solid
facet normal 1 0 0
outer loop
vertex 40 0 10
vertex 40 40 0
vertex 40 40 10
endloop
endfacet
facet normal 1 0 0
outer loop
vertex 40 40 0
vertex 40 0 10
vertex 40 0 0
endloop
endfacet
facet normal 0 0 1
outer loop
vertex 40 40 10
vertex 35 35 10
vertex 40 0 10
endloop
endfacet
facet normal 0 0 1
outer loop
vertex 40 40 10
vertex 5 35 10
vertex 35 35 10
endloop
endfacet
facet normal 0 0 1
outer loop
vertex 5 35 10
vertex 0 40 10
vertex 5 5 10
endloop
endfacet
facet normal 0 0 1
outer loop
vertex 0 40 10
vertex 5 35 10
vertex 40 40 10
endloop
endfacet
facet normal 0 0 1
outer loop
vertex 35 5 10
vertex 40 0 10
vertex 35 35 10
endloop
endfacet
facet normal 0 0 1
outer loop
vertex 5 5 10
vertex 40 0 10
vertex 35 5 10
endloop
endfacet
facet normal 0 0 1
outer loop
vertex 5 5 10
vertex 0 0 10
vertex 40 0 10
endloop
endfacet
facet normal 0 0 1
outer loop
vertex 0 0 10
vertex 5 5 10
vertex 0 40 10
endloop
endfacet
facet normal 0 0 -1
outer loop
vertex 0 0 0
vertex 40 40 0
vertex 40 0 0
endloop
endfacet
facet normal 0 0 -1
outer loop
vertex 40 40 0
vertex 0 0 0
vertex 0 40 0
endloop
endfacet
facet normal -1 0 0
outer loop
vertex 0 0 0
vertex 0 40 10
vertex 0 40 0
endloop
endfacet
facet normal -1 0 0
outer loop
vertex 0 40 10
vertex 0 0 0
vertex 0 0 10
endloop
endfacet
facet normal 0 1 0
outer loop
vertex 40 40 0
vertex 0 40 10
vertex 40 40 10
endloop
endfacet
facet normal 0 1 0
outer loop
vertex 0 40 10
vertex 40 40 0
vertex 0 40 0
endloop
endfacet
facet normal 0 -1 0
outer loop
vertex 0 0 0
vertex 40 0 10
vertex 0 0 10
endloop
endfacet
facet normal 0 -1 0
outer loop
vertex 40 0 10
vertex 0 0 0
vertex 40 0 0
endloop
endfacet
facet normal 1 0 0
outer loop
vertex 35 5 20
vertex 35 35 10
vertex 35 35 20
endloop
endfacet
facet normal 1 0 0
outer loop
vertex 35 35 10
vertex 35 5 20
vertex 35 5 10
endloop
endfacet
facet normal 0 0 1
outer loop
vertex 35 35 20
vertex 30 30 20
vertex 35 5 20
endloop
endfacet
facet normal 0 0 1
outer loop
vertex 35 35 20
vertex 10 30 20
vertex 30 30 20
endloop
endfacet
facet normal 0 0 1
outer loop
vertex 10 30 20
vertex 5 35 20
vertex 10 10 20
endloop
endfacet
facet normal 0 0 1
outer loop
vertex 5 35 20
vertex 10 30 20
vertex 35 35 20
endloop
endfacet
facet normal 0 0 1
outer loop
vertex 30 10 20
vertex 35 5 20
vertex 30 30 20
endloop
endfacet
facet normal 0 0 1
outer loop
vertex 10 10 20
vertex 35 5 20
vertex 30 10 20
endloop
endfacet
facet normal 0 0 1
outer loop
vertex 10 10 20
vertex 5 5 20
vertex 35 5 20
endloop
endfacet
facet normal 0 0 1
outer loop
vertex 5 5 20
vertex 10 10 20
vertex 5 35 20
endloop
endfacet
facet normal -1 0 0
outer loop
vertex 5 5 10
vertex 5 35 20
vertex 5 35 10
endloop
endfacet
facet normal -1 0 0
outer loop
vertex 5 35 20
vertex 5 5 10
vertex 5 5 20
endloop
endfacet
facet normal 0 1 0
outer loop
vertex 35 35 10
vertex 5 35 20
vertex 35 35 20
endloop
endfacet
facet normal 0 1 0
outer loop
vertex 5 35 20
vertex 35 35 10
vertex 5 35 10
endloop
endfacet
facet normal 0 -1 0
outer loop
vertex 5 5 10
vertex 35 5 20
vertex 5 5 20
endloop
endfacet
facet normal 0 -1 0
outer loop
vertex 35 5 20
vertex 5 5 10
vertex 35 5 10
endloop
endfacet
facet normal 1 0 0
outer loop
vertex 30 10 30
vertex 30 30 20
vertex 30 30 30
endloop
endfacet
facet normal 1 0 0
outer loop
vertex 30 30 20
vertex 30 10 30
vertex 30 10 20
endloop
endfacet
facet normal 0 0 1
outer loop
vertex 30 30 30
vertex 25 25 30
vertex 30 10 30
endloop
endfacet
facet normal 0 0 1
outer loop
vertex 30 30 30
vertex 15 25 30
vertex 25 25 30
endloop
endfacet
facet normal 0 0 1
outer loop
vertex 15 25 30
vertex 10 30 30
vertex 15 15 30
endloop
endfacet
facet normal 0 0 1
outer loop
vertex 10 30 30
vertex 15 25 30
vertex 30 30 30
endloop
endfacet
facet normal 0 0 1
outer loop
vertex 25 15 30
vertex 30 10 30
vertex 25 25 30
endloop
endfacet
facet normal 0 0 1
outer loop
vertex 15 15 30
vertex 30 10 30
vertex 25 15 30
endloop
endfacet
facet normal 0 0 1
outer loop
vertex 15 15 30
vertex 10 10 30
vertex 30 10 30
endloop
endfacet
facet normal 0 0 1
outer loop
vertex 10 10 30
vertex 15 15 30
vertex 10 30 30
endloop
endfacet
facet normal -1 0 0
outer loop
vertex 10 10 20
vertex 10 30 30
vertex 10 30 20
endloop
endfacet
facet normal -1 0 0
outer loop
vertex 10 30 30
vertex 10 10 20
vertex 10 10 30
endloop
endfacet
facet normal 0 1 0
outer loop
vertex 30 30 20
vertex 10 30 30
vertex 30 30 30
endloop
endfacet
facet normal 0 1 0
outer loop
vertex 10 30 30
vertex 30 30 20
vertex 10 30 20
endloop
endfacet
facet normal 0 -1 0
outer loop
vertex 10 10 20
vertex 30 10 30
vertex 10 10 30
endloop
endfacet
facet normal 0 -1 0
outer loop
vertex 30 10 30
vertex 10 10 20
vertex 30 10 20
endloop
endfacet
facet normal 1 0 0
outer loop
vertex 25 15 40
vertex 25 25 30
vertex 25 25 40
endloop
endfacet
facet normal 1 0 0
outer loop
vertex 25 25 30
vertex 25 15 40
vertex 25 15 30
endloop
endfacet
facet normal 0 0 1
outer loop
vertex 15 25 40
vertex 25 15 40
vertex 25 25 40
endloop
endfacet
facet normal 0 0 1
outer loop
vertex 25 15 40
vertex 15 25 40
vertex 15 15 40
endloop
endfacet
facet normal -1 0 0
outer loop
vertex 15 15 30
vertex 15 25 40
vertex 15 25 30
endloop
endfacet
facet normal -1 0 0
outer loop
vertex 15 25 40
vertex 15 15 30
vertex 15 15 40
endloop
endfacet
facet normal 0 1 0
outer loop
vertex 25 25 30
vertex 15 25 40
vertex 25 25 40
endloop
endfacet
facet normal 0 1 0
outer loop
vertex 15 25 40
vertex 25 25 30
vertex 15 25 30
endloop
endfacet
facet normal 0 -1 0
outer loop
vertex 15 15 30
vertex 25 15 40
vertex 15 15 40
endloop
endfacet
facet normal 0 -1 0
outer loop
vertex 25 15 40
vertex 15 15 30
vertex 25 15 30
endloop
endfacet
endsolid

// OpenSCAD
union(){
cube([40,40,10]);
translate([5,5,10])
cube([30,30,10]);
translate([10,10,20])
cube([20,20,10]);
translate([15,15,30])
cube([10,10,10]);
}
